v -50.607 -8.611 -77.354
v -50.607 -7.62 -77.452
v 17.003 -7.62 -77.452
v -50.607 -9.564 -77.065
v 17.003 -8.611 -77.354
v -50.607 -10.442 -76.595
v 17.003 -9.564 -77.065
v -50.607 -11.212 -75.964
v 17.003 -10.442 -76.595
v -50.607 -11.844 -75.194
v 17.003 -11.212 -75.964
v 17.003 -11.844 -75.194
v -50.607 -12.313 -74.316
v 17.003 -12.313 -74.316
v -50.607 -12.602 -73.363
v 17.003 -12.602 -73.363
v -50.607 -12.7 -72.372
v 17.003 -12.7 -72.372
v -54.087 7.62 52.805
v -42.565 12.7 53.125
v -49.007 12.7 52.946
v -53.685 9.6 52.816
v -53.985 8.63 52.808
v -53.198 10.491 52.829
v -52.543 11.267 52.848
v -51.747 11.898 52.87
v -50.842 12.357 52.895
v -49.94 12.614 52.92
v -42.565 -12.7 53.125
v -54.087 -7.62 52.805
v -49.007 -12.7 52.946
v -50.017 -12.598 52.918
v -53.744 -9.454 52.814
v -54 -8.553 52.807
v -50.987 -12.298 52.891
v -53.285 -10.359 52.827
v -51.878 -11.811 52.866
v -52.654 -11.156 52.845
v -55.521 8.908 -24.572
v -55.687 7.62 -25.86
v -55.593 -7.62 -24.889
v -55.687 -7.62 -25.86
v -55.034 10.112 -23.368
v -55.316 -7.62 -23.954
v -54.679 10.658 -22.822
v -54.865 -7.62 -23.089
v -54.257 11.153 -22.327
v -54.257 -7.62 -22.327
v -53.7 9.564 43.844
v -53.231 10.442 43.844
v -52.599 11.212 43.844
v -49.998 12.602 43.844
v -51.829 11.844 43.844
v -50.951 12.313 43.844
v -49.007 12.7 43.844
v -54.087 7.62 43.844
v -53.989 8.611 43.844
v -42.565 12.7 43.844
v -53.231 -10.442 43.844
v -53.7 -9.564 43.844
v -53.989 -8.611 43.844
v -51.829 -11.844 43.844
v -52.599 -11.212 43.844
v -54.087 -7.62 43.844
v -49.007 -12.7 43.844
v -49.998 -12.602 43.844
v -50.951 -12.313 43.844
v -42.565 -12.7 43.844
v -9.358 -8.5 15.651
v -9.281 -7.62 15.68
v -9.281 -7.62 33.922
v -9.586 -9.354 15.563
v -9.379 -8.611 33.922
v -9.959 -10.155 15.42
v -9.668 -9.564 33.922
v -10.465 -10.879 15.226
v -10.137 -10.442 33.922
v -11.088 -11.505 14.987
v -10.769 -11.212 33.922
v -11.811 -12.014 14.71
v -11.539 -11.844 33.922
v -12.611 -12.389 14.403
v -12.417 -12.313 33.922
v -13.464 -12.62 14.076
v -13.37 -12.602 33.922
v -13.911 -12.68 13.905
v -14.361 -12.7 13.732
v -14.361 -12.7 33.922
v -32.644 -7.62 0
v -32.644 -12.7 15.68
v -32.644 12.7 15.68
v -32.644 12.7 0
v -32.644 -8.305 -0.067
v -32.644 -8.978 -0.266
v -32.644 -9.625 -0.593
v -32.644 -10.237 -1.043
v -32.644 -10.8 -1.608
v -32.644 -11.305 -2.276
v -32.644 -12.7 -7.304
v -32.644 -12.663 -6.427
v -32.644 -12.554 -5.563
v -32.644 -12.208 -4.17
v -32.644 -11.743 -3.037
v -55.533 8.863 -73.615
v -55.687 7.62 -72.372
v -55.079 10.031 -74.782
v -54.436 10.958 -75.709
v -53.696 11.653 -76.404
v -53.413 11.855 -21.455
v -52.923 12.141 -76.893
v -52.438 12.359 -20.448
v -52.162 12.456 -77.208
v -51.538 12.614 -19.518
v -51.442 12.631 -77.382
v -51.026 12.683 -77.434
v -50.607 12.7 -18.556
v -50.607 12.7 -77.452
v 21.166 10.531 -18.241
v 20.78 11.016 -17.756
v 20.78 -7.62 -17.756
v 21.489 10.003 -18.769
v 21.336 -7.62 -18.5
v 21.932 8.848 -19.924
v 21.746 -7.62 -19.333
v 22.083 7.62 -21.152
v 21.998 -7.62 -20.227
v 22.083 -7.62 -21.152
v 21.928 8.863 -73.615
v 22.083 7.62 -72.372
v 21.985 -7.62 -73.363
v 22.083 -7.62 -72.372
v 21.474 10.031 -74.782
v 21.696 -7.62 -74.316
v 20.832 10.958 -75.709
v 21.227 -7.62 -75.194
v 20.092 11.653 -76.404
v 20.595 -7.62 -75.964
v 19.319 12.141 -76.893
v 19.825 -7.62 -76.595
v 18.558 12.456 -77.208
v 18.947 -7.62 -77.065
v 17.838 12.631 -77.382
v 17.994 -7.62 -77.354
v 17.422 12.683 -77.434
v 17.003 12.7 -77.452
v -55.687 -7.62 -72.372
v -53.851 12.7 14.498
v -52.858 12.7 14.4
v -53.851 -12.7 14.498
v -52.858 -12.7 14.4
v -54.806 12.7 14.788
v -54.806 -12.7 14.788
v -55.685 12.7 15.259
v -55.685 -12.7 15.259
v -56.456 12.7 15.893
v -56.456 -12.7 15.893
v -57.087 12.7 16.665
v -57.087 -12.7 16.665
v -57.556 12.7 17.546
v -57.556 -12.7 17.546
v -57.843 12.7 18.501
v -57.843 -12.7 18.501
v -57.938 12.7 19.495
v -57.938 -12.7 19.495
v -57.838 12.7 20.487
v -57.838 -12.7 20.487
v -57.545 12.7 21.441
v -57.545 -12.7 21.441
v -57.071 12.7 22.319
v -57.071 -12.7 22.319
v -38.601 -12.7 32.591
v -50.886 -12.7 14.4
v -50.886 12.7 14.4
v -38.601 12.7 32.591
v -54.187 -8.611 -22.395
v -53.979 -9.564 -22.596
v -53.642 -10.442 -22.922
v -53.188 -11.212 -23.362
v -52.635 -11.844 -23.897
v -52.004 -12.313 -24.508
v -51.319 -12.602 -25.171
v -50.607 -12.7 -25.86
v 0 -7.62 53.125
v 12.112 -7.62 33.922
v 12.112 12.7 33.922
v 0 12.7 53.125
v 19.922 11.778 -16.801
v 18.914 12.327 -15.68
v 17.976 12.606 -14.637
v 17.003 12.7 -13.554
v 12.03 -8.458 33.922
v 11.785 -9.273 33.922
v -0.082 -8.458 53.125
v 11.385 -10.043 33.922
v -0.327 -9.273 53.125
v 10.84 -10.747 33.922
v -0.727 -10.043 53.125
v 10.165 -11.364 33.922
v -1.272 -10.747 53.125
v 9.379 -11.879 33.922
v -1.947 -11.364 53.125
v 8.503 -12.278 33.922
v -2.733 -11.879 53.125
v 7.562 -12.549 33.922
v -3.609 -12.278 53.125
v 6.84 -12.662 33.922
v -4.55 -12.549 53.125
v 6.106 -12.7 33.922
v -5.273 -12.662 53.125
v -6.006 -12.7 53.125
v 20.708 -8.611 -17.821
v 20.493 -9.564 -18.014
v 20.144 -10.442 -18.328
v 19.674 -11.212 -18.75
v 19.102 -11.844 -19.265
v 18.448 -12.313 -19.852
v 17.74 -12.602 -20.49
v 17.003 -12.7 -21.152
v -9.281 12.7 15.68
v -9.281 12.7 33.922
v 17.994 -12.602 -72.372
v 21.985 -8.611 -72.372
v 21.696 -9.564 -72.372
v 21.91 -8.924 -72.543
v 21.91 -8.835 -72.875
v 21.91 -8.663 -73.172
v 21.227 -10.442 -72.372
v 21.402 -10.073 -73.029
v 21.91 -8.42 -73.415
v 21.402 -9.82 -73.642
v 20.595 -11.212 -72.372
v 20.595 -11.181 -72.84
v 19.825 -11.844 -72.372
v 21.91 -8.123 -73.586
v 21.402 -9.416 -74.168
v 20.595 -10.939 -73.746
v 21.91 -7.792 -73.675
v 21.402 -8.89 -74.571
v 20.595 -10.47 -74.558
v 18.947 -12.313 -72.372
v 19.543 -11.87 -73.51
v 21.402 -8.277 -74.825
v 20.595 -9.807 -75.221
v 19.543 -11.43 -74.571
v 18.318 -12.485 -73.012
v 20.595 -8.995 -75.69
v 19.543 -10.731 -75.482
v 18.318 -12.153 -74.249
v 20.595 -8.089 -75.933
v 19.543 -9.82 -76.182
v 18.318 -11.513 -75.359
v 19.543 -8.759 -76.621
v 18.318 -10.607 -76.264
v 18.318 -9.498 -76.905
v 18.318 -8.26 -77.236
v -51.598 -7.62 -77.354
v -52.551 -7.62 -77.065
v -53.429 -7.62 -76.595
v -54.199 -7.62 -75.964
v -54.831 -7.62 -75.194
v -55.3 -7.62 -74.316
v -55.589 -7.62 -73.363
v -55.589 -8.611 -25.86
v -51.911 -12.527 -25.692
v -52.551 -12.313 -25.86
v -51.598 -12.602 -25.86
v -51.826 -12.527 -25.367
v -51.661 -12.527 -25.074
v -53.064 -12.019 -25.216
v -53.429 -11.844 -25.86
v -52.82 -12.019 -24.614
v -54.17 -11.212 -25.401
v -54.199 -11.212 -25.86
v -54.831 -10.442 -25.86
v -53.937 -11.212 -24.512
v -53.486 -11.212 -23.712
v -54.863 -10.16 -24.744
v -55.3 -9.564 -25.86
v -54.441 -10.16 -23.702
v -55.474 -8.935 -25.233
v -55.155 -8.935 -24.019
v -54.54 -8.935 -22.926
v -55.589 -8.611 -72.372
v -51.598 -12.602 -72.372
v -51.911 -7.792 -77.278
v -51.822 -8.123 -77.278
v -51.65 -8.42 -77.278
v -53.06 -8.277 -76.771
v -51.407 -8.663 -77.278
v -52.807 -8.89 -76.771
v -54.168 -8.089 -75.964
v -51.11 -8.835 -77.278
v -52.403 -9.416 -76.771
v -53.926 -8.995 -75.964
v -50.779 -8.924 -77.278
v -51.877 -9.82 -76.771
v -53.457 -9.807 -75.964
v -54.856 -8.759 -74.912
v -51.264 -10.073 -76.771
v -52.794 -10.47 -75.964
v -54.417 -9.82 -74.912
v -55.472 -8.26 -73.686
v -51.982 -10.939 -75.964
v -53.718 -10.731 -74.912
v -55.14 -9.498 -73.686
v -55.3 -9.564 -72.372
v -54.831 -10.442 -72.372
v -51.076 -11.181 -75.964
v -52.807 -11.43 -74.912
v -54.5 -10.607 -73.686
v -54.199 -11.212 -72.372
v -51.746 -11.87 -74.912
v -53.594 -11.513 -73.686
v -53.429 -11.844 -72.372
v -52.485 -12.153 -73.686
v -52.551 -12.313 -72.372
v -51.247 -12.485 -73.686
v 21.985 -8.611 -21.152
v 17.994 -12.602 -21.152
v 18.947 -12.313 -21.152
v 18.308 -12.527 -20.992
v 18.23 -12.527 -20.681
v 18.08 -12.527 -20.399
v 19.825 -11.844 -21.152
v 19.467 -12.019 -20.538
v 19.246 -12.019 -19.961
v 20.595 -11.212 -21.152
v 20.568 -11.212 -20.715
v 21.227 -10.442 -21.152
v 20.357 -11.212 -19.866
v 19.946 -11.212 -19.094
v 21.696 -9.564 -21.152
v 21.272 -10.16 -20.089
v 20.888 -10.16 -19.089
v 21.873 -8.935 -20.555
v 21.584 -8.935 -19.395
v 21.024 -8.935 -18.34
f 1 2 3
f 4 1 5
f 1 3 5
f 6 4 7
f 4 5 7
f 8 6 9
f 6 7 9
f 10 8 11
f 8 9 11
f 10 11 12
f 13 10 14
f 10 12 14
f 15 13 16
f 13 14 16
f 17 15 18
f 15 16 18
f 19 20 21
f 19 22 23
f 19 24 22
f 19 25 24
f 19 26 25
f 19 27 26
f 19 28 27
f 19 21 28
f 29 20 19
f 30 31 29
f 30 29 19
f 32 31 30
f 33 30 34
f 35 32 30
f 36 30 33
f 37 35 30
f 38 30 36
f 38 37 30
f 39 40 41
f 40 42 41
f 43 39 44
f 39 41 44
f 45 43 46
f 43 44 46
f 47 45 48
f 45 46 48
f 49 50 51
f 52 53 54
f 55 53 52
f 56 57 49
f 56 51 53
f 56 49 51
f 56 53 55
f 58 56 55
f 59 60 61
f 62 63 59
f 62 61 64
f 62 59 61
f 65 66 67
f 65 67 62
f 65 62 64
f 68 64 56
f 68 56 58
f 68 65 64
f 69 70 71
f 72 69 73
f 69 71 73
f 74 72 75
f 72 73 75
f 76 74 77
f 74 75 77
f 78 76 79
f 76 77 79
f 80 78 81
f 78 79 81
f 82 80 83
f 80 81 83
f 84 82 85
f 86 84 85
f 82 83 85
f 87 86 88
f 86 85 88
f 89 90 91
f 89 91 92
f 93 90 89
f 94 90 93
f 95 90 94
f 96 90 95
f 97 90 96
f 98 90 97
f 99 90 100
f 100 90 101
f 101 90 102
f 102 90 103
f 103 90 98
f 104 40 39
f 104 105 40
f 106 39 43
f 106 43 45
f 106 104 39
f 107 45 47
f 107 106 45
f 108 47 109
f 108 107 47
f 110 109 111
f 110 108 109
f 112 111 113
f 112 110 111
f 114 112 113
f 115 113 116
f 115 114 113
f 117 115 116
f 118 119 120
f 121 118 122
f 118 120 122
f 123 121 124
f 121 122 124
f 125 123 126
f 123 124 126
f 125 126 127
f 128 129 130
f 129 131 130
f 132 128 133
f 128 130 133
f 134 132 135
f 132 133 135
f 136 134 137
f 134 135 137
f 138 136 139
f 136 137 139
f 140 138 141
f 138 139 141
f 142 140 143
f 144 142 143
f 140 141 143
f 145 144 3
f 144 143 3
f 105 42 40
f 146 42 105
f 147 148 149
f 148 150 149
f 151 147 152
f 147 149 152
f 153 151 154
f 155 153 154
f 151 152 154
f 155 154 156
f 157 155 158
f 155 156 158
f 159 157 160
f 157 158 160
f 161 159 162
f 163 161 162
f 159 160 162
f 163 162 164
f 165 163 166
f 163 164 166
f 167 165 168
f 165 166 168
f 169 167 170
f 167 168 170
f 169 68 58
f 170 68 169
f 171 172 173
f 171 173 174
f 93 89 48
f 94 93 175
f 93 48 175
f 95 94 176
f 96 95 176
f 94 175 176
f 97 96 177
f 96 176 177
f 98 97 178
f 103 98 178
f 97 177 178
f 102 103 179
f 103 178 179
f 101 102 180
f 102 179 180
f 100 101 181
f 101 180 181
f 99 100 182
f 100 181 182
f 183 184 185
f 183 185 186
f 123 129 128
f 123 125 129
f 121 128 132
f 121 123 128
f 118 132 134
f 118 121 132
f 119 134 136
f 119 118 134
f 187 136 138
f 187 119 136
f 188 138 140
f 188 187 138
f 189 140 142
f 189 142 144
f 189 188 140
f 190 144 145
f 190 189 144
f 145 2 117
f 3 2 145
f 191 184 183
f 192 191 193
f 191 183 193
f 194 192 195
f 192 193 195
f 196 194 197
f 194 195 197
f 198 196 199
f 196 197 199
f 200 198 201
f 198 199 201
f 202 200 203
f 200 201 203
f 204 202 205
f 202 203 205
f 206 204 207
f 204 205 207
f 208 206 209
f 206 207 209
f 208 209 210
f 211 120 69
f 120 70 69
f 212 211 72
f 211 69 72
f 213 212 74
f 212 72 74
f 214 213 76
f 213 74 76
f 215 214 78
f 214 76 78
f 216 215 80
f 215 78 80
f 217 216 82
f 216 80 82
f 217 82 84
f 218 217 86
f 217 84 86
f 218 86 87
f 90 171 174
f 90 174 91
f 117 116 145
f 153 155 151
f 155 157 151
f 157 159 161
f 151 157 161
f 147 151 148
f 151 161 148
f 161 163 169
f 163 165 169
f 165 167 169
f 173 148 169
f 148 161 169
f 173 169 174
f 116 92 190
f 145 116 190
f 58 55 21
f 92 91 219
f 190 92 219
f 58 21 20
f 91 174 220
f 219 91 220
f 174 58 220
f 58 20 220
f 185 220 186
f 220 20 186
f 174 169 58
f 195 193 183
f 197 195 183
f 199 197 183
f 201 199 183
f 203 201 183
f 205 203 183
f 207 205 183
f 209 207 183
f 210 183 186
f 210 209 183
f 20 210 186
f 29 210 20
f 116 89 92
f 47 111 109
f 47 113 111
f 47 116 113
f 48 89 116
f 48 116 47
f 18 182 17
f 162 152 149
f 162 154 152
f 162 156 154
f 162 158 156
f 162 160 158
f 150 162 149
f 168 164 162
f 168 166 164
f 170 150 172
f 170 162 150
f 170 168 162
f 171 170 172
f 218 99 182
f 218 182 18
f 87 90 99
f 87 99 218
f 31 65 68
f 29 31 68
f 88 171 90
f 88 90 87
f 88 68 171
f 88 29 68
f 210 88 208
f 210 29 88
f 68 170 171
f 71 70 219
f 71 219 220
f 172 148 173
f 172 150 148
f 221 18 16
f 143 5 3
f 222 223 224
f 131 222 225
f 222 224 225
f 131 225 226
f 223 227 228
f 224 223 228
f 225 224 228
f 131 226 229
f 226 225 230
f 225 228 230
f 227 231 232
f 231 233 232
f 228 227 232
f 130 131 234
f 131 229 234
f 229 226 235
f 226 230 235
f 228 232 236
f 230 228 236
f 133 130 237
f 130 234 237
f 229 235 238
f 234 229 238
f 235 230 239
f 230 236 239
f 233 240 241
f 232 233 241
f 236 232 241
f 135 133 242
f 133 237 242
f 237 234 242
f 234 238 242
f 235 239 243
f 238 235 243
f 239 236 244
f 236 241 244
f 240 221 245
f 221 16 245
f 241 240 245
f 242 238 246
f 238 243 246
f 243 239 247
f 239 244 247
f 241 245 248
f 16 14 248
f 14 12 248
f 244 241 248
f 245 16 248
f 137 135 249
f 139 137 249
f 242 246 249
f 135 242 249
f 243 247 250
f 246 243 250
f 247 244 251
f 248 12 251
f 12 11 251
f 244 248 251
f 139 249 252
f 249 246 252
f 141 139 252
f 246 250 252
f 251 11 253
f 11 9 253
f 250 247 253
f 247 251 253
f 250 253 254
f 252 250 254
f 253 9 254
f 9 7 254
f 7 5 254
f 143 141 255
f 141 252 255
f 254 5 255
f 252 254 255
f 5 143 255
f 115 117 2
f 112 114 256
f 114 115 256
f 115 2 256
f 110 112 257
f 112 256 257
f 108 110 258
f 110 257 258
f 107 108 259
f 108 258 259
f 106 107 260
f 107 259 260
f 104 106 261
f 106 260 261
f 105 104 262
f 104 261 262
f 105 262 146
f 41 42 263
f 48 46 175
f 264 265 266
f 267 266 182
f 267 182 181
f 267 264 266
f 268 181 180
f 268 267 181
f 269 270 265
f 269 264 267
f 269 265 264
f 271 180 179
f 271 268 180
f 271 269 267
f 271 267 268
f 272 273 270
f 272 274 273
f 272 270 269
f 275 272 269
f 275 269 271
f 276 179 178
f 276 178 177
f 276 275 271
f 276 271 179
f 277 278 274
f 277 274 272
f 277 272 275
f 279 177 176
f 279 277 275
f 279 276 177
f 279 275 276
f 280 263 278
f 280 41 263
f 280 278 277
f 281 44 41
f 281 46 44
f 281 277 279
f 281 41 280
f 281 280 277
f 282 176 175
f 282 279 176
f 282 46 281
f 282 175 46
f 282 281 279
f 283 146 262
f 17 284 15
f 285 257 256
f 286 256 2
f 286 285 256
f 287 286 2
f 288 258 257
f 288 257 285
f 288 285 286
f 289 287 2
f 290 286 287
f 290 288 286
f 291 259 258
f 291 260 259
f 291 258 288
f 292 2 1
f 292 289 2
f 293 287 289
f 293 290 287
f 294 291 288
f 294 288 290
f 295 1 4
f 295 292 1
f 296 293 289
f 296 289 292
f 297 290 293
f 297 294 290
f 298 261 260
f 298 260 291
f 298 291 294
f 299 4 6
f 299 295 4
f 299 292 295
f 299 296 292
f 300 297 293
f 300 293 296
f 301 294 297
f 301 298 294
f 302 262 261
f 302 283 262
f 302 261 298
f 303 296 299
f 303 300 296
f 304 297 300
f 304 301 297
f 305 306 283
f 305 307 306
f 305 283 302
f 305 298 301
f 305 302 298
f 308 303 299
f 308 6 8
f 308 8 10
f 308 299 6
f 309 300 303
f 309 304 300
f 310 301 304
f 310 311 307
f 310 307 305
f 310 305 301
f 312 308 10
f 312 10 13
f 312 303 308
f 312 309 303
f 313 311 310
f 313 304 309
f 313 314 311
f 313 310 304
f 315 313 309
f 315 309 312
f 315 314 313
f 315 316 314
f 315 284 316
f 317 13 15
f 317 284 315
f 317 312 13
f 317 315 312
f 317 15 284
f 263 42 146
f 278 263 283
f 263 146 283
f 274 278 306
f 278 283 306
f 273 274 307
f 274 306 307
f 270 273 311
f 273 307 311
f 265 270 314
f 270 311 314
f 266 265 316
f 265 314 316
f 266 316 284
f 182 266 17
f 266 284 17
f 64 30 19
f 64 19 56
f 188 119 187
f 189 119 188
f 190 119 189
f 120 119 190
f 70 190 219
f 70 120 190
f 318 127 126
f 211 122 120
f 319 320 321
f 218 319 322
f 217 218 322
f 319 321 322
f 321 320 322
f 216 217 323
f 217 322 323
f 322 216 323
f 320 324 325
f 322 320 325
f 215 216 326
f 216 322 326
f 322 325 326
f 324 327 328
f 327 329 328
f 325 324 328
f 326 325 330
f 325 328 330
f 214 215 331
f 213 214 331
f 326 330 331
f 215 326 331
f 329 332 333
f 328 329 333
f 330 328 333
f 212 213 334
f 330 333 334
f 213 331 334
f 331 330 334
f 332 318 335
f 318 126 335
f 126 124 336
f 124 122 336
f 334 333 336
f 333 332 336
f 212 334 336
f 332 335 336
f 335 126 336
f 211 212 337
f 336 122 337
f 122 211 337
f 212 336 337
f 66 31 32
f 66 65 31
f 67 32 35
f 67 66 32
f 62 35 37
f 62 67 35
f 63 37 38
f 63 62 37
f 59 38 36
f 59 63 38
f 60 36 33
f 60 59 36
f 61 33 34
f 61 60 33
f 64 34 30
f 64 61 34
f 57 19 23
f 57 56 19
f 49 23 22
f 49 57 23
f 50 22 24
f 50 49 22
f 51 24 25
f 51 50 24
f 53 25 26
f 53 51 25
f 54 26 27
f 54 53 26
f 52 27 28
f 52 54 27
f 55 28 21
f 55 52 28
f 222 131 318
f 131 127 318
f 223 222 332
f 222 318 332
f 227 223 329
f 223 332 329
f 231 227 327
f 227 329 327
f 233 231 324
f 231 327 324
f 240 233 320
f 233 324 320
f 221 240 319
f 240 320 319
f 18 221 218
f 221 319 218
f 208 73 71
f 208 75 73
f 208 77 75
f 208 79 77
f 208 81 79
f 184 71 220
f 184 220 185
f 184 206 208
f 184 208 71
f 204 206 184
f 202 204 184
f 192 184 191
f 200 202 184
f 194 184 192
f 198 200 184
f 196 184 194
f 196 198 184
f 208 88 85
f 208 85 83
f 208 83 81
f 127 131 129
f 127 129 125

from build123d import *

# Parameters (mm, degrees)
F1_DEPTH = 12.7
F2_R     = 5.08


with BuildPart() as f1:
    # F0 (on Front) → F1 (new body, symmetric)
    with BuildSketch(Plane.XZ):
        Polygon((-42.56532, 53.124823), (-54.08676, 52.804779), (-54.08676, 43.843661), (-42.56532, 43.843661), align=None)
        Polygon((-38.601383, 32.591193), (-42.56532, 43.843661), (-62.407799, 14.399981), (-50.886359, 14.399981), align=None)
        Polygon((-9.281159, 15.680142), (-32.644082, 15.680142), (-32.644082, 0), (-55.686962, -23.803976), (-55.686962, -77.451505), (22.082759, -77.451505), (22.082759, -19.20422), align=None)
        Polygon((0, 53.124823), (-42.56532, 53.124823), (-42.56532, 43.843661), (-38.601383, 32.591193), (-32.644082, 15.680142), (-9.281159, 15.680142), (-9.281159, 33.922419), (12.112285, 33.922419), align=None)
    extrude(amount=F1_DEPTH, both=True)

    # F2
    f2_edges = [f1.edges().sort_by_distance(p)[0] for p in [
        (-55.686962, -12.7, -50.62774),
        (-44.165522, -12.7, -11.901988),
        (-55.686962, 0, -23.803976),
        (-55.686962, 12.7, -50.62774),
        (-55.686962, 0, -77.451505),
        (-16.802101, -12.7, -77.451505),
        (22.082759, -12.7, -48.327862),
        (6.4008, -12.7, -1.762039),
        (-9.281159, -12.7, 24.80128),
        (6.056143, -12.7, 43.523621),
        (-54.08676, -12.7, 48.32422),
        (-54.08676, 12.7, 48.32422),
        (-62.407799, 0, 14.399981),
        (22.082759, 12.7, -48.327862),
        (22.082759, 0, -19.20422),
        (22.082759, 0, -77.451505),
    ]]
    fillet(f2_edges, radius=F2_R)


solid = f1.part
